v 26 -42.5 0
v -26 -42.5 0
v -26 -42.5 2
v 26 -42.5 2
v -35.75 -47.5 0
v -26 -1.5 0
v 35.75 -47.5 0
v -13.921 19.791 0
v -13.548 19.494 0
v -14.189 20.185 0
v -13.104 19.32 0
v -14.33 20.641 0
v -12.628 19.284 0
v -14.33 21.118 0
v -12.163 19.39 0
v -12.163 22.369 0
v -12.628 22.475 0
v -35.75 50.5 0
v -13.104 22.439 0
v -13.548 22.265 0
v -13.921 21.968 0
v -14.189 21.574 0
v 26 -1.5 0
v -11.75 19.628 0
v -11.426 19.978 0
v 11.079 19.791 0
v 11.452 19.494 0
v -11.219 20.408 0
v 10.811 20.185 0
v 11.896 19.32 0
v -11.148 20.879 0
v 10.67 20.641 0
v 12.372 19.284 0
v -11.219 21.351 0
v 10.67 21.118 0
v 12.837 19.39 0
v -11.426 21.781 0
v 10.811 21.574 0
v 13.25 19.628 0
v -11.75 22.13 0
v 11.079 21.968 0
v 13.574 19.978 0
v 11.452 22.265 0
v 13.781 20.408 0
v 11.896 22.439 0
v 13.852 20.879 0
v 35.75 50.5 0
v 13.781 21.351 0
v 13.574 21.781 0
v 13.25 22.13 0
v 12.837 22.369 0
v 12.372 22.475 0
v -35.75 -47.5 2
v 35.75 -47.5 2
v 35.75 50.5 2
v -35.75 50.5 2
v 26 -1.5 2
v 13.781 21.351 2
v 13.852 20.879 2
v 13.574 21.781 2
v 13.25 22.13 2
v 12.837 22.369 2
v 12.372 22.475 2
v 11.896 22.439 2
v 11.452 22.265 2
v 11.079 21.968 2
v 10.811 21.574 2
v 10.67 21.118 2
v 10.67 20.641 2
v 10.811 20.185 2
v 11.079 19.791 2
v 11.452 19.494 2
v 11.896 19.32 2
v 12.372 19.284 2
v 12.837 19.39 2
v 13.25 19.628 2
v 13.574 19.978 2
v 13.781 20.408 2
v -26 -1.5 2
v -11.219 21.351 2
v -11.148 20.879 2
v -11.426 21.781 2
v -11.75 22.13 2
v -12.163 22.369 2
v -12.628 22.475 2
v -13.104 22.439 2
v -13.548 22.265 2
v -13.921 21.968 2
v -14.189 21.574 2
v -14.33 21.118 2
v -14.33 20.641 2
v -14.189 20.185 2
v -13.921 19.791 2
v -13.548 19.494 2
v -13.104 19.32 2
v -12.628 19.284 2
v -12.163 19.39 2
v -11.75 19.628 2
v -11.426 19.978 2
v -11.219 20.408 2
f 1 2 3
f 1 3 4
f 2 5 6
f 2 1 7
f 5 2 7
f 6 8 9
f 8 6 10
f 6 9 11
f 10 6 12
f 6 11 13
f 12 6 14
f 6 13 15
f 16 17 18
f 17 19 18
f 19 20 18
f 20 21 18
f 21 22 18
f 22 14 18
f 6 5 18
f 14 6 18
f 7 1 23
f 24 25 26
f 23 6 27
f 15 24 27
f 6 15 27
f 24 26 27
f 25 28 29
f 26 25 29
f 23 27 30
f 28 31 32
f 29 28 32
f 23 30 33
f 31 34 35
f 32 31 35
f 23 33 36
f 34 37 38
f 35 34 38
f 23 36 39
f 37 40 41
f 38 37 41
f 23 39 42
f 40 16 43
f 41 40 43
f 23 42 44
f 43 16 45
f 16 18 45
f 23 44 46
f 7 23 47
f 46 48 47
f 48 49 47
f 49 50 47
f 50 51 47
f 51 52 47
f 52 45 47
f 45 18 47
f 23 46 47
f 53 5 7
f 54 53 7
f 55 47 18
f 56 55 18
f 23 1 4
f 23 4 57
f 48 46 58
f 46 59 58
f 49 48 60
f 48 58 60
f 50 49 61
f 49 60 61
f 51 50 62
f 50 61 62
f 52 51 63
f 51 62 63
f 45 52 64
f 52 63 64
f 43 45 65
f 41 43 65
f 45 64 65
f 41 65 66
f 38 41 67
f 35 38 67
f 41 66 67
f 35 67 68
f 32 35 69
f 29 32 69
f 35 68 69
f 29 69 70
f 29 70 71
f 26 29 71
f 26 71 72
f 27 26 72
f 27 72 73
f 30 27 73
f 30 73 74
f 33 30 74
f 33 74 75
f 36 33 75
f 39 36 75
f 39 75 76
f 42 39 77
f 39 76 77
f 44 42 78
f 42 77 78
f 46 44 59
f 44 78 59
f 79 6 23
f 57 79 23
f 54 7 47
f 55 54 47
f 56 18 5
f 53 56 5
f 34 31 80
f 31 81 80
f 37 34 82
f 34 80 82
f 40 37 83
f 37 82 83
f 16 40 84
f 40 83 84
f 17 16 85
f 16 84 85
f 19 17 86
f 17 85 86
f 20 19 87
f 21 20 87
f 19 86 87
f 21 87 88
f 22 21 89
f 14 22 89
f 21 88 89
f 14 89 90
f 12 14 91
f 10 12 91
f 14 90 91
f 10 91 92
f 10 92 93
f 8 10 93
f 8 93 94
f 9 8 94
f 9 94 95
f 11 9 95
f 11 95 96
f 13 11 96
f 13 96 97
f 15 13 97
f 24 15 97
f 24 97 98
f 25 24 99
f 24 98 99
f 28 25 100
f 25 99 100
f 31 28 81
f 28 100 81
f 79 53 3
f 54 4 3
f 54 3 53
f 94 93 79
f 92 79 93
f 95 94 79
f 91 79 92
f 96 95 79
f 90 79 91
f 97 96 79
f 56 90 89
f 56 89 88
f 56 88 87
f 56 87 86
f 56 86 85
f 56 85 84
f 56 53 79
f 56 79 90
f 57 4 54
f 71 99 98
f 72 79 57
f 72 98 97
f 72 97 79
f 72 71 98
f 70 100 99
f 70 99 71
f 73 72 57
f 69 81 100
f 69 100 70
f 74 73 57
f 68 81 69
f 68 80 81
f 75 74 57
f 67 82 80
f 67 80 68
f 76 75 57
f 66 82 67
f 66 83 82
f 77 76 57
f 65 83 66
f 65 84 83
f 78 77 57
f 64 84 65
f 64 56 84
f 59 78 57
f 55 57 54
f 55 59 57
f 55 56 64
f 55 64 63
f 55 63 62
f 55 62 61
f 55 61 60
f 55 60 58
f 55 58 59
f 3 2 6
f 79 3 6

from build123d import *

# Parameters (mm, degrees)
SKETCH_1_W      = 52
SKETCH_1_H      = 41
EXTRUDE_1_DEPTH = 2
F_3_0MM_1_D     = 3.2
F_3_0MM_1_DEPTH = 2
F_3_0MM_1_TIP   = 0.96137699


with BuildPart() as part:
    # 草图1 → 凸台-拉伸1 (new body)
    with BuildSketch(Plane.XY):
        Polygon((35.75, 47.5), (35.75, 50.5), (-35.75, 50.5), (-35.75, 47.5), (-35.75, -47.5), (35.75, -47.5), align=None)
        with Locations((0, -22)):
            Rectangle(SKETCH_1_W, SKETCH_1_H, mode=Mode.SUBTRACT)
    extrude(amount=EXTRUDE_1_DEPTH)

    # Ø3.0mm 暗销孔1
    with Locations(Plane(origin=(68.159346192, -140.5, 0), x_dir=(-1, 0, 0), z_dir=(0, 0, -1))):
        with Locations((80.907068169, 161.379417443), (55.907068169, 161.379417443)):
            Hole(F_3_0MM_1_D / 2, depth=F_3_0MM_1_DEPTH)
            with Locations((0, 0, -(F_3_0MM_1_DEPTH + F_3_0MM_1_TIP / 2))):  # 118° drill point
                Cone(0, F_3_0MM_1_D / 2, F_3_0MM_1_TIP, mode=Mode.SUBTRACT)


solid = part.part
